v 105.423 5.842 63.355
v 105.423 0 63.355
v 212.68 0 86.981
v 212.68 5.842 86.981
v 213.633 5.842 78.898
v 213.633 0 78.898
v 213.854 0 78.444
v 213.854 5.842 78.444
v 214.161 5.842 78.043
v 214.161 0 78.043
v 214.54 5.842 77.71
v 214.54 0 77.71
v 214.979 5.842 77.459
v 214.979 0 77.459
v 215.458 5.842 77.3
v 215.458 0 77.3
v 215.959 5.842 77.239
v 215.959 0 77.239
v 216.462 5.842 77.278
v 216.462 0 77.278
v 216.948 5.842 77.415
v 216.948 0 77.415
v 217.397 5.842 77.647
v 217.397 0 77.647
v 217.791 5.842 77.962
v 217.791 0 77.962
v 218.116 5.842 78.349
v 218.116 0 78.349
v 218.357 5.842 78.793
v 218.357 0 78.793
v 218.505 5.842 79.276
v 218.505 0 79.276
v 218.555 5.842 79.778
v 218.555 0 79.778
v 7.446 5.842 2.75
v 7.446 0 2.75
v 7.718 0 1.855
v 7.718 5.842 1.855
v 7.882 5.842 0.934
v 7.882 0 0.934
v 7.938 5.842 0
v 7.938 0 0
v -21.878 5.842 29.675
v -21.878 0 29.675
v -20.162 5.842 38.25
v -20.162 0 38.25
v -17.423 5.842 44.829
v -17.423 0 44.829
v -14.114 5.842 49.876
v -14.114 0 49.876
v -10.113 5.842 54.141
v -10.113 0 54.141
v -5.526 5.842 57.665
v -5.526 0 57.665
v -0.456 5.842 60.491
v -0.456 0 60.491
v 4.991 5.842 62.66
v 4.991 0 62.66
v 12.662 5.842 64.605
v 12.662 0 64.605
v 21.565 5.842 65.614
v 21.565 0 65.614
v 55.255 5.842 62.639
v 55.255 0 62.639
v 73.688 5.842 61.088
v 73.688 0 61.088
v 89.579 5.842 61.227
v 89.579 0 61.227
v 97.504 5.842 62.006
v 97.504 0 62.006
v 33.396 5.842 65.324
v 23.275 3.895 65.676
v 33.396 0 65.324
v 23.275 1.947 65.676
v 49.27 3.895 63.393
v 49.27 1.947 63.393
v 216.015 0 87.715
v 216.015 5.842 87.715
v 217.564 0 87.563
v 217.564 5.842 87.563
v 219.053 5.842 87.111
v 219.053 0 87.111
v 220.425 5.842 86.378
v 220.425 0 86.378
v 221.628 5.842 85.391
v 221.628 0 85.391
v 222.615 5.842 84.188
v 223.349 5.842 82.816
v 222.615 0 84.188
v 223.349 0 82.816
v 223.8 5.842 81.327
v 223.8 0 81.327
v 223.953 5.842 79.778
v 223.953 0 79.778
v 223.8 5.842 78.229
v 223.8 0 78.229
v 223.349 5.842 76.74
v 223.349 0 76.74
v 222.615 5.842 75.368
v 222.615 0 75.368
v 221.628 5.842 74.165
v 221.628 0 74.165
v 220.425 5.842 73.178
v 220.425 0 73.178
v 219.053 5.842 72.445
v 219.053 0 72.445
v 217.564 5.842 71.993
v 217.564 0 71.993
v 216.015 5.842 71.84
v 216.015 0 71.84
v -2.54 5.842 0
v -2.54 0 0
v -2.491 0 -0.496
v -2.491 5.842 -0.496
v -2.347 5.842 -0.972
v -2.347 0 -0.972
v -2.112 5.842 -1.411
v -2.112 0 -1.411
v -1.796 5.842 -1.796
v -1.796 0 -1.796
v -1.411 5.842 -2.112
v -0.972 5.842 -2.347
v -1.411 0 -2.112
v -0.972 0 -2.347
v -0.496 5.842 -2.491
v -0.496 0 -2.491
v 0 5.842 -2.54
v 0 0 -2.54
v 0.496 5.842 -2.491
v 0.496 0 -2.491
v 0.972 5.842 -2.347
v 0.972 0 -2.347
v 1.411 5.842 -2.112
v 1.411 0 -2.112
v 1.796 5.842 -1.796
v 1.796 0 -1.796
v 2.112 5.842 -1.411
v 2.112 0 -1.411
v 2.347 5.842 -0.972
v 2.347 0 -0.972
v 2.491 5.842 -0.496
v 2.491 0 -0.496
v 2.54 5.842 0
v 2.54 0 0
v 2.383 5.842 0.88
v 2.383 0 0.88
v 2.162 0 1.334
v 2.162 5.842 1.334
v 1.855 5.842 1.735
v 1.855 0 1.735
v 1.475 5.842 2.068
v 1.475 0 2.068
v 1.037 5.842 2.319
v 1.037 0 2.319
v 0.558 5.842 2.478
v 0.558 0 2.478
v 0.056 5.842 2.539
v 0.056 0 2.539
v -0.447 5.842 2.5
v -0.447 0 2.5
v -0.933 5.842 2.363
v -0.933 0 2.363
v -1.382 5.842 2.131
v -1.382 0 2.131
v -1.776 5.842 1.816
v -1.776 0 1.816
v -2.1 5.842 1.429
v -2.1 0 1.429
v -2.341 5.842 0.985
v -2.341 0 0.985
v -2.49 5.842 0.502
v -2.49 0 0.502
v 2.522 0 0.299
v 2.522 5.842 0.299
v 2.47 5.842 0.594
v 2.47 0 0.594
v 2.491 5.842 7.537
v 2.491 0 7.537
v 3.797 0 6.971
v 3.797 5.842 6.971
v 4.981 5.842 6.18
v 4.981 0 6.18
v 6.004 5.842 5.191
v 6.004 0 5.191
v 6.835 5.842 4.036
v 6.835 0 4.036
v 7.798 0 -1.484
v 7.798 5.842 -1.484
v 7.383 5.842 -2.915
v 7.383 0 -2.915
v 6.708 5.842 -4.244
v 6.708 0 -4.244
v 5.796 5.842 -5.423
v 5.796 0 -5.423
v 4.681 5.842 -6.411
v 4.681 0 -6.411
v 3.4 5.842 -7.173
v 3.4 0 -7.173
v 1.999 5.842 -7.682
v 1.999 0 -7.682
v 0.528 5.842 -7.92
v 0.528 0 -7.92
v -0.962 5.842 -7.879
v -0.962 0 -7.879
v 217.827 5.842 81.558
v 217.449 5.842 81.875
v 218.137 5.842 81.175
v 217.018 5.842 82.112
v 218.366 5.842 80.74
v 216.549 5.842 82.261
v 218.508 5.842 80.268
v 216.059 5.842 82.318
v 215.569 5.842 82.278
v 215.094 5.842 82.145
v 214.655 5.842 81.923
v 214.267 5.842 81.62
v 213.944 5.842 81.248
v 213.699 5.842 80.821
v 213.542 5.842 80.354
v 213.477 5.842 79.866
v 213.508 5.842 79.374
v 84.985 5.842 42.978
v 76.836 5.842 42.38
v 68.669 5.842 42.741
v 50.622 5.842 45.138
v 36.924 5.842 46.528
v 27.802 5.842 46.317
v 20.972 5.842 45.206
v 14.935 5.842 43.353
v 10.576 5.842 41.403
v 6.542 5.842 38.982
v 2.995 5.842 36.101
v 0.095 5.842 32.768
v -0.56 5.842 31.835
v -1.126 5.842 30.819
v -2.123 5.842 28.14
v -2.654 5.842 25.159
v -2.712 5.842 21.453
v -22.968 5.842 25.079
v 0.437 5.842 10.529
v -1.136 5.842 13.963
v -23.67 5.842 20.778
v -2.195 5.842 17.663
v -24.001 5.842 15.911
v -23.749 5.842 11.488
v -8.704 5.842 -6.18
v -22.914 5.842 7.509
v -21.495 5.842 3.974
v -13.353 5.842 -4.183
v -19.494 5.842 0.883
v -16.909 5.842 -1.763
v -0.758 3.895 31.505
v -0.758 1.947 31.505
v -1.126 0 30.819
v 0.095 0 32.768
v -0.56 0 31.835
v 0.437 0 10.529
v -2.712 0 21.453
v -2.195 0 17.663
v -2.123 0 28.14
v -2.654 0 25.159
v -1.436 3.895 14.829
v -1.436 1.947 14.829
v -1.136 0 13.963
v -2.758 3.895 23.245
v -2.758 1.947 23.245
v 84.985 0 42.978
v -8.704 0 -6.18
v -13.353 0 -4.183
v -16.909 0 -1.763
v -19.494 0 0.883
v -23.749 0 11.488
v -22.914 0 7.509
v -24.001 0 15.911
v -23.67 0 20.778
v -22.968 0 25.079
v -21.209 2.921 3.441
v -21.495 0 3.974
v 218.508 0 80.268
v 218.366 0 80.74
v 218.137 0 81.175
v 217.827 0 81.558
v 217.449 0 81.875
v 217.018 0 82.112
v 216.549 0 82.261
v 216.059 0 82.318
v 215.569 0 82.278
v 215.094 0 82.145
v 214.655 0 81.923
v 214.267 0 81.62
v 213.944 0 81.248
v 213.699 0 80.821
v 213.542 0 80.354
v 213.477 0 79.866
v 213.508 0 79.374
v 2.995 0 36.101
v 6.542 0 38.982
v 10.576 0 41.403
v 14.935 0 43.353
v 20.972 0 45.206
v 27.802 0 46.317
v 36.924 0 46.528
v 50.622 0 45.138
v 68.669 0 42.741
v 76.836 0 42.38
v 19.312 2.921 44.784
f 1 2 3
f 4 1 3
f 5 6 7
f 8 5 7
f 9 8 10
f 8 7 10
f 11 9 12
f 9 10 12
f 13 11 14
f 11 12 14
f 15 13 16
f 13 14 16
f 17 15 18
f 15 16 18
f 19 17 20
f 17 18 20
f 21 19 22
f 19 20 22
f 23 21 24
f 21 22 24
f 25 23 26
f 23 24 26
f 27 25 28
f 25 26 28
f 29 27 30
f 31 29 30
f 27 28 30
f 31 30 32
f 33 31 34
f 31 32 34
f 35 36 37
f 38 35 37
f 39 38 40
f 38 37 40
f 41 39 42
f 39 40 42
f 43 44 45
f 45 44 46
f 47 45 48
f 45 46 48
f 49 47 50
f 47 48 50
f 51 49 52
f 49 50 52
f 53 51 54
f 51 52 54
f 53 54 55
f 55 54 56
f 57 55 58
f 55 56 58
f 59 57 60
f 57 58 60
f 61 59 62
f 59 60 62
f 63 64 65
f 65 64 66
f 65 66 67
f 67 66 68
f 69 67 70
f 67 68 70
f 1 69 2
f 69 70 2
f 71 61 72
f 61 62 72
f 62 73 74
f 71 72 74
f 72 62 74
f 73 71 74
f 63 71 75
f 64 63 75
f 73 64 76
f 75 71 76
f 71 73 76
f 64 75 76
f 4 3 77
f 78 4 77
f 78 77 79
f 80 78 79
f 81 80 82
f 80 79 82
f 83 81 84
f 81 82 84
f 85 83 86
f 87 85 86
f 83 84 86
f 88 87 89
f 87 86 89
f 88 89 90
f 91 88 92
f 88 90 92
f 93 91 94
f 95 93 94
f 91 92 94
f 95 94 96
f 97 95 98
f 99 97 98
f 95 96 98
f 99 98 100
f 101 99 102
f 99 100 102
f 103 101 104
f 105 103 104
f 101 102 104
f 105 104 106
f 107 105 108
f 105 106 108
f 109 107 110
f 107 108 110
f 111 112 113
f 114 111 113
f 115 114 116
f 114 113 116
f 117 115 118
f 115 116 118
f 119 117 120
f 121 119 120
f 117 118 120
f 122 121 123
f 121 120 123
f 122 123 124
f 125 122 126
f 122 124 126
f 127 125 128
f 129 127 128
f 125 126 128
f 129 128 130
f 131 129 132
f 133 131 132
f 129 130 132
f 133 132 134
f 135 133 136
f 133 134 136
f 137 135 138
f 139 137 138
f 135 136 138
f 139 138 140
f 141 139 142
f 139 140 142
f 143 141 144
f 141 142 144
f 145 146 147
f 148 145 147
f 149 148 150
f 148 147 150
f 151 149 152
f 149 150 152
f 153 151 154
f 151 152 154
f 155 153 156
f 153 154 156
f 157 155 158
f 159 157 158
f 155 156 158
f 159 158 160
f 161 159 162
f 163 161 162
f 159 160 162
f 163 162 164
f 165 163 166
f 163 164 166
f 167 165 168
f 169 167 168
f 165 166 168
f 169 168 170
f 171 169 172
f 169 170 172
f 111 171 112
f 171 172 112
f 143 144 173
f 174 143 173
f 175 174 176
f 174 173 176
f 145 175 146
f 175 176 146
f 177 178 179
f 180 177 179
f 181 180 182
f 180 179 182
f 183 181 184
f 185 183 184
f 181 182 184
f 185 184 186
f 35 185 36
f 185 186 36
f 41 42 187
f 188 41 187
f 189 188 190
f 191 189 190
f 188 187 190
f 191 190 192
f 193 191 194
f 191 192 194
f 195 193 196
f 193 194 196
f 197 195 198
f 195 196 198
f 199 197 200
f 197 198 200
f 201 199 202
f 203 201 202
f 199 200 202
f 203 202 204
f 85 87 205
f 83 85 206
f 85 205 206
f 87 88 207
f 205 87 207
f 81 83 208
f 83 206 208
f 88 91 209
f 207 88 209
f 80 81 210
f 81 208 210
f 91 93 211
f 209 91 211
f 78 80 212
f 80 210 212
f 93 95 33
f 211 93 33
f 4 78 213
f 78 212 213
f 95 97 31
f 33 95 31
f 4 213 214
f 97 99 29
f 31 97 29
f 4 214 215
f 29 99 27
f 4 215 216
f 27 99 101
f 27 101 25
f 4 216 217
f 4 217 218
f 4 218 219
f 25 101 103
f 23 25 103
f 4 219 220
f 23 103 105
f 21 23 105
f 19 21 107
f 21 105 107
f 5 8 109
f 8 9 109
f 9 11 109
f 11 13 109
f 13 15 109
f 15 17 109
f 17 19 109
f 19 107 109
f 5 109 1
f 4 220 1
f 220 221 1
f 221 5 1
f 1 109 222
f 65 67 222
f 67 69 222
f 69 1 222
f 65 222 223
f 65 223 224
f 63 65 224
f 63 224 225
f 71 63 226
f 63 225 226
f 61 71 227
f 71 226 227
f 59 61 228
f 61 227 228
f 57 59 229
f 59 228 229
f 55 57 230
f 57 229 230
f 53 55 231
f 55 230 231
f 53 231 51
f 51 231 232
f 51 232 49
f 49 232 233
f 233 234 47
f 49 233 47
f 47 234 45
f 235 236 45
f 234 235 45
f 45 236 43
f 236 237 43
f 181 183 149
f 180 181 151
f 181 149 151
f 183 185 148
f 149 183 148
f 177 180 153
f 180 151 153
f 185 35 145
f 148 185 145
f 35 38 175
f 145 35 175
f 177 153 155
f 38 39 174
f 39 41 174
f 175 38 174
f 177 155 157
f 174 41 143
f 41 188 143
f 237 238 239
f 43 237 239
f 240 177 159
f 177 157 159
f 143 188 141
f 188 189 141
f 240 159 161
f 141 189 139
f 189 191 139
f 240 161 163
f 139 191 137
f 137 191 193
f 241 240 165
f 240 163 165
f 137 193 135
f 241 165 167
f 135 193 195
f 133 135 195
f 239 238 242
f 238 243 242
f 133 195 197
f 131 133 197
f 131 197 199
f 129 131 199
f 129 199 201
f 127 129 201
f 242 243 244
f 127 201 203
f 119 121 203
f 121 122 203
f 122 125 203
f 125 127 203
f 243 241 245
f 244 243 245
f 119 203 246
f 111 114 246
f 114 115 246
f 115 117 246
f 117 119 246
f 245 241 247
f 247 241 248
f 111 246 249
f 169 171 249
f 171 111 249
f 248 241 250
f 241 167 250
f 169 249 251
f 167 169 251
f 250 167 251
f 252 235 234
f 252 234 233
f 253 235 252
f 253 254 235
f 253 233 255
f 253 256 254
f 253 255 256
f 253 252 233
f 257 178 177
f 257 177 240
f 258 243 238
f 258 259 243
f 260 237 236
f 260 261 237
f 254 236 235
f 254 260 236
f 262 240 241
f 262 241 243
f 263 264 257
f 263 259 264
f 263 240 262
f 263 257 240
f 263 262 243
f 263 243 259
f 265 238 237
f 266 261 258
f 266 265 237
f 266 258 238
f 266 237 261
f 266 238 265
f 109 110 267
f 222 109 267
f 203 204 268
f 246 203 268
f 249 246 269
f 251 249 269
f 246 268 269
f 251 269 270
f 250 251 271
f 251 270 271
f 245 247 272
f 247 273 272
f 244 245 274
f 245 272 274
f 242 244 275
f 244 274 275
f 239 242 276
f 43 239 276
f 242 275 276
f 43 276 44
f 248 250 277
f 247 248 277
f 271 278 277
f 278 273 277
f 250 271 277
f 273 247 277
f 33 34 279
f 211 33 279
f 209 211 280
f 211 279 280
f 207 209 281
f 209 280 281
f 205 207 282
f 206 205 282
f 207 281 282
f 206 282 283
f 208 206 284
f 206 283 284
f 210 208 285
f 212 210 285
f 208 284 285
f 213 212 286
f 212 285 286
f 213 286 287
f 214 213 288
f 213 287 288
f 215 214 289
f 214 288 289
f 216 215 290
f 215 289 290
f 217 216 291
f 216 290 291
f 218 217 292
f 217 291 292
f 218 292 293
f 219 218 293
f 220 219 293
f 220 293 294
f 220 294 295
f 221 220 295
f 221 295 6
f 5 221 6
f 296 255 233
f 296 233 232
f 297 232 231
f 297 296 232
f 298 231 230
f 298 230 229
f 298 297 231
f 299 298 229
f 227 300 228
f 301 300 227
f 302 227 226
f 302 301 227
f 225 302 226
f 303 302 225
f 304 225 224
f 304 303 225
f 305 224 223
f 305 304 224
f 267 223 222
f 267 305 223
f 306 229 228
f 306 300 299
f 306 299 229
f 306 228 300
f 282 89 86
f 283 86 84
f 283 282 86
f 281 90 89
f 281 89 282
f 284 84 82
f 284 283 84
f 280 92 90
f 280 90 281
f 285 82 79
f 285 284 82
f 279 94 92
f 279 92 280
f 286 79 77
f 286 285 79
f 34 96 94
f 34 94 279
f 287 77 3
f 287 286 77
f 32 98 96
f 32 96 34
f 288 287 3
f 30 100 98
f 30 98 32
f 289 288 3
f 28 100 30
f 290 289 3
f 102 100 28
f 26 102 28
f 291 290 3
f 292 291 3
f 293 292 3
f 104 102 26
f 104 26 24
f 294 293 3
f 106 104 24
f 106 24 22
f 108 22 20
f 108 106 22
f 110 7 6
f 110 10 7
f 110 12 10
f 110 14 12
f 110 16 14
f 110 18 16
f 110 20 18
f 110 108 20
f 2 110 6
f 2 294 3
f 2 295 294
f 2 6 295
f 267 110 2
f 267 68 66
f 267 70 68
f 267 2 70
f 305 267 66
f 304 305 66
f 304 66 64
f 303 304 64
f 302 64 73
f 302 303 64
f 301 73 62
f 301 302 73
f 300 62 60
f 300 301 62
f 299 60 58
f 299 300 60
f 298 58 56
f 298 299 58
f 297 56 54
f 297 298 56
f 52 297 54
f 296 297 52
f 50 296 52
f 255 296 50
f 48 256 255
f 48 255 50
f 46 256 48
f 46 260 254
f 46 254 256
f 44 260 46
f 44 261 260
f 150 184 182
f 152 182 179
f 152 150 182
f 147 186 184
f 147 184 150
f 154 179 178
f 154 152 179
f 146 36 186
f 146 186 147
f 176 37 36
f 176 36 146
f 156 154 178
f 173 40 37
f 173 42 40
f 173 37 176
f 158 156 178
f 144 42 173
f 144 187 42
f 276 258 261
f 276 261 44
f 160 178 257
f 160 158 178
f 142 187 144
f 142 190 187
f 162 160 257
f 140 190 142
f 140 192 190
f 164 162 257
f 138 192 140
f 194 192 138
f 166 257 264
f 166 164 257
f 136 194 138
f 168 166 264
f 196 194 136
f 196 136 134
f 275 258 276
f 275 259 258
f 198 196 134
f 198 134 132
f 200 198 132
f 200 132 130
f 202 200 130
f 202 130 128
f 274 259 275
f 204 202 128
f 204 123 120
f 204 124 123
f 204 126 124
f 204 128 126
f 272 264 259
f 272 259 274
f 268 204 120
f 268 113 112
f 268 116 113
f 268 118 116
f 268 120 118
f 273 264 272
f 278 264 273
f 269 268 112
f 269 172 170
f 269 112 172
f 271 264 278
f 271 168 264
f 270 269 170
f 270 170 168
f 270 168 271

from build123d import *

# Parameters (mm, degrees)
BOSS_EXTRUDE1_DEPTH = 5.842


with BuildPart() as part:
    # Sketch1 → Boss-Extrude1 (new body)
    # profile 1 of 4: a face of its own
    with BuildSketch(Plane(origin=(0, 0, 0), x_dir=(1, 0, 0), z_dir=(0, 1, 0))):
        with BuildLine():
            Line((5.702829673, -2.106146828), (2.382698971, -0.879969097))
            ThreePointArc((2.382698971, -0.879969097), (-0.446958954, -2.500365512), (-2.54, 0))
            ThreePointArc((-2.54, 0), (0, 2.54), (2.54, 0))
            Line((2.54, 0), (7.9375, 0))
            ThreePointArc((7.9375, 0), (5.261697448, 5.942932459), (-0.961636054, 7.879033085))
            add(Edge.make_bspline(
                [(-0.961636054, 7.879033085), (-30.998516546, 4.016509883), (-21.878356409, -29.675127641)],
                knots=[0, 0, 0, 0.355275027, 0.355275027, 0.355275027], degree=2))
            add(Edge.make_bspline(
                [(-21.878356409, -29.675127641), (-19.175708983, -55.861204147), (11.698983968, -69.097417628), (59.195053048, -61.613083253), (86.70608699, -59.429980277), (105.423206443, -63.354848985)],
                knots=[0, 0, 0, 0, 0.428303153, 0.609288088, 1, 1, 1, 1], degree=3))
            Line((105.423206443, -63.354848985), (212.680451258, -86.98087497))
            Line((212.680451258, -86.98087497), (216.015488734, -87.715498371))
            ThreePointArc((216.015488734, -87.715498371), (223.952988734, -79.777998371), (216.015488734, -71.840498371))
            Line((216.015488734, -71.840498371), (84.985142991, -42.97786668))
            add(Edge.make_bspline(
                [(0.09474692, -32.76830731), (4.27176872, -38.654864898), (33.548769413, -54.534810158), (63.191046617, -39.772775003), (84.985142991, -42.97786668)],
                knots=[0.196438425, 0.196438425, 0.196438425, 0.196438425, 0.402512938, 1, 1, 1, 1], degree=3))
            add(Edge.make_bspline(
                [(-1.126256356, -30.819140758), (-0.777763255, -31.521796137), (-0.371419038, -32.175243295), (0.09474692, -32.76830731)],
                knots=[0.355072169, 0.355072169, 0.355072169, 0.355072169, 0.385912125, 0.385912125, 0.385912125, 0.385912125], degree=3))
            add(Edge.make_bspline(
                [(2.490643555, -7.53661734), (-2.624036668, -13.613014345), (-4.349309359, -24.320603116), (-1.126256356, -30.819140758)],
                knots=[0.069847551, 0.069847551, 0.069847551, 0.069847551, 0.355072169, 0.355072169, 0.355072169, 0.355072169], degree=3))
            ThreePointArc((2.490643555, -7.53661734), (5.51471235, -5.708927565), (7.445934285, -2.749903429))
            Line((7.445934285, -2.749903429), (5.702829673, -2.106146828))
        make_face()
        with BuildLine():
            ThreePointArc((213.632789762, -78.898029274), (216.462447688, -77.27763286), (218.555488734, -79.777998371))
            ThreePointArc((218.555488734, -79.777998371), (215.56852978, -82.278363883), (213.632789762, -78.898029274))
        make_face(mode=Mode.SUBTRACT)
    # profile 2 of 4: a face of its own
    with BuildSketch(Plane(origin=(0, 0, 0), x_dir=(1, 0, 0), z_dir=(0, 1, 0))):
        with BuildLine():
            add(Edge.make_bspline(
                [(5.702829673, -2.106146828), (6.77439514, -1.073513348), (7.9375, 0)],
                knots=[0.965211712, 0.965211712, 0.965211712, 1, 1, 1], degree=2))
            Line((5.702829673, -2.106146828), (7.445934285, -2.749903429))
            ThreePointArc((7.445934285, -2.749903429), (7.813642225, -1.396746731), (7.9375, 0))
        make_face()
    # profile 3 of 4: a face of its own
    with BuildSketch(Plane(origin=(0, 0, 0), x_dir=(1, 0, 0), z_dir=(0, 1, 0))):
        with BuildLine():
            ThreePointArc((2.54, 0), (2.500365512, -0.446958954), (2.382698971, -0.879969097))
            Line((2.382698971, -0.879969097), (5.702829673, -2.106146828))
            add(Edge.make_bspline(
                [(5.702829673, -2.106146828), (6.77439514, -1.073513348), (7.9375, 0)],
                knots=[0.965211712, 0.965211712, 0.965211712, 1, 1, 1], degree=2))
            Line((7.9375, 0), (2.54, 0))
        make_face()
    # profile 4 of 4: a face of its own
    with BuildSketch(Plane(origin=(0, 0, 0), x_dir=(1, 0, 0), z_dir=(0, 1, 0))):
        with BuildLine():
            add(Edge.make_bspline(
                [(5.702829673, -2.106146828), (6.77439514, -1.073513348), (7.9375, 0)],
                knots=[0.965211712, 0.965211712, 0.965211712, 1, 1, 1], degree=2))
            Line((5.702829673, -2.106146828), (7.445934285, -2.749903429))
            ThreePointArc((7.445934285, -2.749903429), (7.813642225, -1.396746731), (7.9375, 0))
        make_face()
    extrude(amount=BOSS_EXTRUDE1_DEPTH)


solid = part.part
